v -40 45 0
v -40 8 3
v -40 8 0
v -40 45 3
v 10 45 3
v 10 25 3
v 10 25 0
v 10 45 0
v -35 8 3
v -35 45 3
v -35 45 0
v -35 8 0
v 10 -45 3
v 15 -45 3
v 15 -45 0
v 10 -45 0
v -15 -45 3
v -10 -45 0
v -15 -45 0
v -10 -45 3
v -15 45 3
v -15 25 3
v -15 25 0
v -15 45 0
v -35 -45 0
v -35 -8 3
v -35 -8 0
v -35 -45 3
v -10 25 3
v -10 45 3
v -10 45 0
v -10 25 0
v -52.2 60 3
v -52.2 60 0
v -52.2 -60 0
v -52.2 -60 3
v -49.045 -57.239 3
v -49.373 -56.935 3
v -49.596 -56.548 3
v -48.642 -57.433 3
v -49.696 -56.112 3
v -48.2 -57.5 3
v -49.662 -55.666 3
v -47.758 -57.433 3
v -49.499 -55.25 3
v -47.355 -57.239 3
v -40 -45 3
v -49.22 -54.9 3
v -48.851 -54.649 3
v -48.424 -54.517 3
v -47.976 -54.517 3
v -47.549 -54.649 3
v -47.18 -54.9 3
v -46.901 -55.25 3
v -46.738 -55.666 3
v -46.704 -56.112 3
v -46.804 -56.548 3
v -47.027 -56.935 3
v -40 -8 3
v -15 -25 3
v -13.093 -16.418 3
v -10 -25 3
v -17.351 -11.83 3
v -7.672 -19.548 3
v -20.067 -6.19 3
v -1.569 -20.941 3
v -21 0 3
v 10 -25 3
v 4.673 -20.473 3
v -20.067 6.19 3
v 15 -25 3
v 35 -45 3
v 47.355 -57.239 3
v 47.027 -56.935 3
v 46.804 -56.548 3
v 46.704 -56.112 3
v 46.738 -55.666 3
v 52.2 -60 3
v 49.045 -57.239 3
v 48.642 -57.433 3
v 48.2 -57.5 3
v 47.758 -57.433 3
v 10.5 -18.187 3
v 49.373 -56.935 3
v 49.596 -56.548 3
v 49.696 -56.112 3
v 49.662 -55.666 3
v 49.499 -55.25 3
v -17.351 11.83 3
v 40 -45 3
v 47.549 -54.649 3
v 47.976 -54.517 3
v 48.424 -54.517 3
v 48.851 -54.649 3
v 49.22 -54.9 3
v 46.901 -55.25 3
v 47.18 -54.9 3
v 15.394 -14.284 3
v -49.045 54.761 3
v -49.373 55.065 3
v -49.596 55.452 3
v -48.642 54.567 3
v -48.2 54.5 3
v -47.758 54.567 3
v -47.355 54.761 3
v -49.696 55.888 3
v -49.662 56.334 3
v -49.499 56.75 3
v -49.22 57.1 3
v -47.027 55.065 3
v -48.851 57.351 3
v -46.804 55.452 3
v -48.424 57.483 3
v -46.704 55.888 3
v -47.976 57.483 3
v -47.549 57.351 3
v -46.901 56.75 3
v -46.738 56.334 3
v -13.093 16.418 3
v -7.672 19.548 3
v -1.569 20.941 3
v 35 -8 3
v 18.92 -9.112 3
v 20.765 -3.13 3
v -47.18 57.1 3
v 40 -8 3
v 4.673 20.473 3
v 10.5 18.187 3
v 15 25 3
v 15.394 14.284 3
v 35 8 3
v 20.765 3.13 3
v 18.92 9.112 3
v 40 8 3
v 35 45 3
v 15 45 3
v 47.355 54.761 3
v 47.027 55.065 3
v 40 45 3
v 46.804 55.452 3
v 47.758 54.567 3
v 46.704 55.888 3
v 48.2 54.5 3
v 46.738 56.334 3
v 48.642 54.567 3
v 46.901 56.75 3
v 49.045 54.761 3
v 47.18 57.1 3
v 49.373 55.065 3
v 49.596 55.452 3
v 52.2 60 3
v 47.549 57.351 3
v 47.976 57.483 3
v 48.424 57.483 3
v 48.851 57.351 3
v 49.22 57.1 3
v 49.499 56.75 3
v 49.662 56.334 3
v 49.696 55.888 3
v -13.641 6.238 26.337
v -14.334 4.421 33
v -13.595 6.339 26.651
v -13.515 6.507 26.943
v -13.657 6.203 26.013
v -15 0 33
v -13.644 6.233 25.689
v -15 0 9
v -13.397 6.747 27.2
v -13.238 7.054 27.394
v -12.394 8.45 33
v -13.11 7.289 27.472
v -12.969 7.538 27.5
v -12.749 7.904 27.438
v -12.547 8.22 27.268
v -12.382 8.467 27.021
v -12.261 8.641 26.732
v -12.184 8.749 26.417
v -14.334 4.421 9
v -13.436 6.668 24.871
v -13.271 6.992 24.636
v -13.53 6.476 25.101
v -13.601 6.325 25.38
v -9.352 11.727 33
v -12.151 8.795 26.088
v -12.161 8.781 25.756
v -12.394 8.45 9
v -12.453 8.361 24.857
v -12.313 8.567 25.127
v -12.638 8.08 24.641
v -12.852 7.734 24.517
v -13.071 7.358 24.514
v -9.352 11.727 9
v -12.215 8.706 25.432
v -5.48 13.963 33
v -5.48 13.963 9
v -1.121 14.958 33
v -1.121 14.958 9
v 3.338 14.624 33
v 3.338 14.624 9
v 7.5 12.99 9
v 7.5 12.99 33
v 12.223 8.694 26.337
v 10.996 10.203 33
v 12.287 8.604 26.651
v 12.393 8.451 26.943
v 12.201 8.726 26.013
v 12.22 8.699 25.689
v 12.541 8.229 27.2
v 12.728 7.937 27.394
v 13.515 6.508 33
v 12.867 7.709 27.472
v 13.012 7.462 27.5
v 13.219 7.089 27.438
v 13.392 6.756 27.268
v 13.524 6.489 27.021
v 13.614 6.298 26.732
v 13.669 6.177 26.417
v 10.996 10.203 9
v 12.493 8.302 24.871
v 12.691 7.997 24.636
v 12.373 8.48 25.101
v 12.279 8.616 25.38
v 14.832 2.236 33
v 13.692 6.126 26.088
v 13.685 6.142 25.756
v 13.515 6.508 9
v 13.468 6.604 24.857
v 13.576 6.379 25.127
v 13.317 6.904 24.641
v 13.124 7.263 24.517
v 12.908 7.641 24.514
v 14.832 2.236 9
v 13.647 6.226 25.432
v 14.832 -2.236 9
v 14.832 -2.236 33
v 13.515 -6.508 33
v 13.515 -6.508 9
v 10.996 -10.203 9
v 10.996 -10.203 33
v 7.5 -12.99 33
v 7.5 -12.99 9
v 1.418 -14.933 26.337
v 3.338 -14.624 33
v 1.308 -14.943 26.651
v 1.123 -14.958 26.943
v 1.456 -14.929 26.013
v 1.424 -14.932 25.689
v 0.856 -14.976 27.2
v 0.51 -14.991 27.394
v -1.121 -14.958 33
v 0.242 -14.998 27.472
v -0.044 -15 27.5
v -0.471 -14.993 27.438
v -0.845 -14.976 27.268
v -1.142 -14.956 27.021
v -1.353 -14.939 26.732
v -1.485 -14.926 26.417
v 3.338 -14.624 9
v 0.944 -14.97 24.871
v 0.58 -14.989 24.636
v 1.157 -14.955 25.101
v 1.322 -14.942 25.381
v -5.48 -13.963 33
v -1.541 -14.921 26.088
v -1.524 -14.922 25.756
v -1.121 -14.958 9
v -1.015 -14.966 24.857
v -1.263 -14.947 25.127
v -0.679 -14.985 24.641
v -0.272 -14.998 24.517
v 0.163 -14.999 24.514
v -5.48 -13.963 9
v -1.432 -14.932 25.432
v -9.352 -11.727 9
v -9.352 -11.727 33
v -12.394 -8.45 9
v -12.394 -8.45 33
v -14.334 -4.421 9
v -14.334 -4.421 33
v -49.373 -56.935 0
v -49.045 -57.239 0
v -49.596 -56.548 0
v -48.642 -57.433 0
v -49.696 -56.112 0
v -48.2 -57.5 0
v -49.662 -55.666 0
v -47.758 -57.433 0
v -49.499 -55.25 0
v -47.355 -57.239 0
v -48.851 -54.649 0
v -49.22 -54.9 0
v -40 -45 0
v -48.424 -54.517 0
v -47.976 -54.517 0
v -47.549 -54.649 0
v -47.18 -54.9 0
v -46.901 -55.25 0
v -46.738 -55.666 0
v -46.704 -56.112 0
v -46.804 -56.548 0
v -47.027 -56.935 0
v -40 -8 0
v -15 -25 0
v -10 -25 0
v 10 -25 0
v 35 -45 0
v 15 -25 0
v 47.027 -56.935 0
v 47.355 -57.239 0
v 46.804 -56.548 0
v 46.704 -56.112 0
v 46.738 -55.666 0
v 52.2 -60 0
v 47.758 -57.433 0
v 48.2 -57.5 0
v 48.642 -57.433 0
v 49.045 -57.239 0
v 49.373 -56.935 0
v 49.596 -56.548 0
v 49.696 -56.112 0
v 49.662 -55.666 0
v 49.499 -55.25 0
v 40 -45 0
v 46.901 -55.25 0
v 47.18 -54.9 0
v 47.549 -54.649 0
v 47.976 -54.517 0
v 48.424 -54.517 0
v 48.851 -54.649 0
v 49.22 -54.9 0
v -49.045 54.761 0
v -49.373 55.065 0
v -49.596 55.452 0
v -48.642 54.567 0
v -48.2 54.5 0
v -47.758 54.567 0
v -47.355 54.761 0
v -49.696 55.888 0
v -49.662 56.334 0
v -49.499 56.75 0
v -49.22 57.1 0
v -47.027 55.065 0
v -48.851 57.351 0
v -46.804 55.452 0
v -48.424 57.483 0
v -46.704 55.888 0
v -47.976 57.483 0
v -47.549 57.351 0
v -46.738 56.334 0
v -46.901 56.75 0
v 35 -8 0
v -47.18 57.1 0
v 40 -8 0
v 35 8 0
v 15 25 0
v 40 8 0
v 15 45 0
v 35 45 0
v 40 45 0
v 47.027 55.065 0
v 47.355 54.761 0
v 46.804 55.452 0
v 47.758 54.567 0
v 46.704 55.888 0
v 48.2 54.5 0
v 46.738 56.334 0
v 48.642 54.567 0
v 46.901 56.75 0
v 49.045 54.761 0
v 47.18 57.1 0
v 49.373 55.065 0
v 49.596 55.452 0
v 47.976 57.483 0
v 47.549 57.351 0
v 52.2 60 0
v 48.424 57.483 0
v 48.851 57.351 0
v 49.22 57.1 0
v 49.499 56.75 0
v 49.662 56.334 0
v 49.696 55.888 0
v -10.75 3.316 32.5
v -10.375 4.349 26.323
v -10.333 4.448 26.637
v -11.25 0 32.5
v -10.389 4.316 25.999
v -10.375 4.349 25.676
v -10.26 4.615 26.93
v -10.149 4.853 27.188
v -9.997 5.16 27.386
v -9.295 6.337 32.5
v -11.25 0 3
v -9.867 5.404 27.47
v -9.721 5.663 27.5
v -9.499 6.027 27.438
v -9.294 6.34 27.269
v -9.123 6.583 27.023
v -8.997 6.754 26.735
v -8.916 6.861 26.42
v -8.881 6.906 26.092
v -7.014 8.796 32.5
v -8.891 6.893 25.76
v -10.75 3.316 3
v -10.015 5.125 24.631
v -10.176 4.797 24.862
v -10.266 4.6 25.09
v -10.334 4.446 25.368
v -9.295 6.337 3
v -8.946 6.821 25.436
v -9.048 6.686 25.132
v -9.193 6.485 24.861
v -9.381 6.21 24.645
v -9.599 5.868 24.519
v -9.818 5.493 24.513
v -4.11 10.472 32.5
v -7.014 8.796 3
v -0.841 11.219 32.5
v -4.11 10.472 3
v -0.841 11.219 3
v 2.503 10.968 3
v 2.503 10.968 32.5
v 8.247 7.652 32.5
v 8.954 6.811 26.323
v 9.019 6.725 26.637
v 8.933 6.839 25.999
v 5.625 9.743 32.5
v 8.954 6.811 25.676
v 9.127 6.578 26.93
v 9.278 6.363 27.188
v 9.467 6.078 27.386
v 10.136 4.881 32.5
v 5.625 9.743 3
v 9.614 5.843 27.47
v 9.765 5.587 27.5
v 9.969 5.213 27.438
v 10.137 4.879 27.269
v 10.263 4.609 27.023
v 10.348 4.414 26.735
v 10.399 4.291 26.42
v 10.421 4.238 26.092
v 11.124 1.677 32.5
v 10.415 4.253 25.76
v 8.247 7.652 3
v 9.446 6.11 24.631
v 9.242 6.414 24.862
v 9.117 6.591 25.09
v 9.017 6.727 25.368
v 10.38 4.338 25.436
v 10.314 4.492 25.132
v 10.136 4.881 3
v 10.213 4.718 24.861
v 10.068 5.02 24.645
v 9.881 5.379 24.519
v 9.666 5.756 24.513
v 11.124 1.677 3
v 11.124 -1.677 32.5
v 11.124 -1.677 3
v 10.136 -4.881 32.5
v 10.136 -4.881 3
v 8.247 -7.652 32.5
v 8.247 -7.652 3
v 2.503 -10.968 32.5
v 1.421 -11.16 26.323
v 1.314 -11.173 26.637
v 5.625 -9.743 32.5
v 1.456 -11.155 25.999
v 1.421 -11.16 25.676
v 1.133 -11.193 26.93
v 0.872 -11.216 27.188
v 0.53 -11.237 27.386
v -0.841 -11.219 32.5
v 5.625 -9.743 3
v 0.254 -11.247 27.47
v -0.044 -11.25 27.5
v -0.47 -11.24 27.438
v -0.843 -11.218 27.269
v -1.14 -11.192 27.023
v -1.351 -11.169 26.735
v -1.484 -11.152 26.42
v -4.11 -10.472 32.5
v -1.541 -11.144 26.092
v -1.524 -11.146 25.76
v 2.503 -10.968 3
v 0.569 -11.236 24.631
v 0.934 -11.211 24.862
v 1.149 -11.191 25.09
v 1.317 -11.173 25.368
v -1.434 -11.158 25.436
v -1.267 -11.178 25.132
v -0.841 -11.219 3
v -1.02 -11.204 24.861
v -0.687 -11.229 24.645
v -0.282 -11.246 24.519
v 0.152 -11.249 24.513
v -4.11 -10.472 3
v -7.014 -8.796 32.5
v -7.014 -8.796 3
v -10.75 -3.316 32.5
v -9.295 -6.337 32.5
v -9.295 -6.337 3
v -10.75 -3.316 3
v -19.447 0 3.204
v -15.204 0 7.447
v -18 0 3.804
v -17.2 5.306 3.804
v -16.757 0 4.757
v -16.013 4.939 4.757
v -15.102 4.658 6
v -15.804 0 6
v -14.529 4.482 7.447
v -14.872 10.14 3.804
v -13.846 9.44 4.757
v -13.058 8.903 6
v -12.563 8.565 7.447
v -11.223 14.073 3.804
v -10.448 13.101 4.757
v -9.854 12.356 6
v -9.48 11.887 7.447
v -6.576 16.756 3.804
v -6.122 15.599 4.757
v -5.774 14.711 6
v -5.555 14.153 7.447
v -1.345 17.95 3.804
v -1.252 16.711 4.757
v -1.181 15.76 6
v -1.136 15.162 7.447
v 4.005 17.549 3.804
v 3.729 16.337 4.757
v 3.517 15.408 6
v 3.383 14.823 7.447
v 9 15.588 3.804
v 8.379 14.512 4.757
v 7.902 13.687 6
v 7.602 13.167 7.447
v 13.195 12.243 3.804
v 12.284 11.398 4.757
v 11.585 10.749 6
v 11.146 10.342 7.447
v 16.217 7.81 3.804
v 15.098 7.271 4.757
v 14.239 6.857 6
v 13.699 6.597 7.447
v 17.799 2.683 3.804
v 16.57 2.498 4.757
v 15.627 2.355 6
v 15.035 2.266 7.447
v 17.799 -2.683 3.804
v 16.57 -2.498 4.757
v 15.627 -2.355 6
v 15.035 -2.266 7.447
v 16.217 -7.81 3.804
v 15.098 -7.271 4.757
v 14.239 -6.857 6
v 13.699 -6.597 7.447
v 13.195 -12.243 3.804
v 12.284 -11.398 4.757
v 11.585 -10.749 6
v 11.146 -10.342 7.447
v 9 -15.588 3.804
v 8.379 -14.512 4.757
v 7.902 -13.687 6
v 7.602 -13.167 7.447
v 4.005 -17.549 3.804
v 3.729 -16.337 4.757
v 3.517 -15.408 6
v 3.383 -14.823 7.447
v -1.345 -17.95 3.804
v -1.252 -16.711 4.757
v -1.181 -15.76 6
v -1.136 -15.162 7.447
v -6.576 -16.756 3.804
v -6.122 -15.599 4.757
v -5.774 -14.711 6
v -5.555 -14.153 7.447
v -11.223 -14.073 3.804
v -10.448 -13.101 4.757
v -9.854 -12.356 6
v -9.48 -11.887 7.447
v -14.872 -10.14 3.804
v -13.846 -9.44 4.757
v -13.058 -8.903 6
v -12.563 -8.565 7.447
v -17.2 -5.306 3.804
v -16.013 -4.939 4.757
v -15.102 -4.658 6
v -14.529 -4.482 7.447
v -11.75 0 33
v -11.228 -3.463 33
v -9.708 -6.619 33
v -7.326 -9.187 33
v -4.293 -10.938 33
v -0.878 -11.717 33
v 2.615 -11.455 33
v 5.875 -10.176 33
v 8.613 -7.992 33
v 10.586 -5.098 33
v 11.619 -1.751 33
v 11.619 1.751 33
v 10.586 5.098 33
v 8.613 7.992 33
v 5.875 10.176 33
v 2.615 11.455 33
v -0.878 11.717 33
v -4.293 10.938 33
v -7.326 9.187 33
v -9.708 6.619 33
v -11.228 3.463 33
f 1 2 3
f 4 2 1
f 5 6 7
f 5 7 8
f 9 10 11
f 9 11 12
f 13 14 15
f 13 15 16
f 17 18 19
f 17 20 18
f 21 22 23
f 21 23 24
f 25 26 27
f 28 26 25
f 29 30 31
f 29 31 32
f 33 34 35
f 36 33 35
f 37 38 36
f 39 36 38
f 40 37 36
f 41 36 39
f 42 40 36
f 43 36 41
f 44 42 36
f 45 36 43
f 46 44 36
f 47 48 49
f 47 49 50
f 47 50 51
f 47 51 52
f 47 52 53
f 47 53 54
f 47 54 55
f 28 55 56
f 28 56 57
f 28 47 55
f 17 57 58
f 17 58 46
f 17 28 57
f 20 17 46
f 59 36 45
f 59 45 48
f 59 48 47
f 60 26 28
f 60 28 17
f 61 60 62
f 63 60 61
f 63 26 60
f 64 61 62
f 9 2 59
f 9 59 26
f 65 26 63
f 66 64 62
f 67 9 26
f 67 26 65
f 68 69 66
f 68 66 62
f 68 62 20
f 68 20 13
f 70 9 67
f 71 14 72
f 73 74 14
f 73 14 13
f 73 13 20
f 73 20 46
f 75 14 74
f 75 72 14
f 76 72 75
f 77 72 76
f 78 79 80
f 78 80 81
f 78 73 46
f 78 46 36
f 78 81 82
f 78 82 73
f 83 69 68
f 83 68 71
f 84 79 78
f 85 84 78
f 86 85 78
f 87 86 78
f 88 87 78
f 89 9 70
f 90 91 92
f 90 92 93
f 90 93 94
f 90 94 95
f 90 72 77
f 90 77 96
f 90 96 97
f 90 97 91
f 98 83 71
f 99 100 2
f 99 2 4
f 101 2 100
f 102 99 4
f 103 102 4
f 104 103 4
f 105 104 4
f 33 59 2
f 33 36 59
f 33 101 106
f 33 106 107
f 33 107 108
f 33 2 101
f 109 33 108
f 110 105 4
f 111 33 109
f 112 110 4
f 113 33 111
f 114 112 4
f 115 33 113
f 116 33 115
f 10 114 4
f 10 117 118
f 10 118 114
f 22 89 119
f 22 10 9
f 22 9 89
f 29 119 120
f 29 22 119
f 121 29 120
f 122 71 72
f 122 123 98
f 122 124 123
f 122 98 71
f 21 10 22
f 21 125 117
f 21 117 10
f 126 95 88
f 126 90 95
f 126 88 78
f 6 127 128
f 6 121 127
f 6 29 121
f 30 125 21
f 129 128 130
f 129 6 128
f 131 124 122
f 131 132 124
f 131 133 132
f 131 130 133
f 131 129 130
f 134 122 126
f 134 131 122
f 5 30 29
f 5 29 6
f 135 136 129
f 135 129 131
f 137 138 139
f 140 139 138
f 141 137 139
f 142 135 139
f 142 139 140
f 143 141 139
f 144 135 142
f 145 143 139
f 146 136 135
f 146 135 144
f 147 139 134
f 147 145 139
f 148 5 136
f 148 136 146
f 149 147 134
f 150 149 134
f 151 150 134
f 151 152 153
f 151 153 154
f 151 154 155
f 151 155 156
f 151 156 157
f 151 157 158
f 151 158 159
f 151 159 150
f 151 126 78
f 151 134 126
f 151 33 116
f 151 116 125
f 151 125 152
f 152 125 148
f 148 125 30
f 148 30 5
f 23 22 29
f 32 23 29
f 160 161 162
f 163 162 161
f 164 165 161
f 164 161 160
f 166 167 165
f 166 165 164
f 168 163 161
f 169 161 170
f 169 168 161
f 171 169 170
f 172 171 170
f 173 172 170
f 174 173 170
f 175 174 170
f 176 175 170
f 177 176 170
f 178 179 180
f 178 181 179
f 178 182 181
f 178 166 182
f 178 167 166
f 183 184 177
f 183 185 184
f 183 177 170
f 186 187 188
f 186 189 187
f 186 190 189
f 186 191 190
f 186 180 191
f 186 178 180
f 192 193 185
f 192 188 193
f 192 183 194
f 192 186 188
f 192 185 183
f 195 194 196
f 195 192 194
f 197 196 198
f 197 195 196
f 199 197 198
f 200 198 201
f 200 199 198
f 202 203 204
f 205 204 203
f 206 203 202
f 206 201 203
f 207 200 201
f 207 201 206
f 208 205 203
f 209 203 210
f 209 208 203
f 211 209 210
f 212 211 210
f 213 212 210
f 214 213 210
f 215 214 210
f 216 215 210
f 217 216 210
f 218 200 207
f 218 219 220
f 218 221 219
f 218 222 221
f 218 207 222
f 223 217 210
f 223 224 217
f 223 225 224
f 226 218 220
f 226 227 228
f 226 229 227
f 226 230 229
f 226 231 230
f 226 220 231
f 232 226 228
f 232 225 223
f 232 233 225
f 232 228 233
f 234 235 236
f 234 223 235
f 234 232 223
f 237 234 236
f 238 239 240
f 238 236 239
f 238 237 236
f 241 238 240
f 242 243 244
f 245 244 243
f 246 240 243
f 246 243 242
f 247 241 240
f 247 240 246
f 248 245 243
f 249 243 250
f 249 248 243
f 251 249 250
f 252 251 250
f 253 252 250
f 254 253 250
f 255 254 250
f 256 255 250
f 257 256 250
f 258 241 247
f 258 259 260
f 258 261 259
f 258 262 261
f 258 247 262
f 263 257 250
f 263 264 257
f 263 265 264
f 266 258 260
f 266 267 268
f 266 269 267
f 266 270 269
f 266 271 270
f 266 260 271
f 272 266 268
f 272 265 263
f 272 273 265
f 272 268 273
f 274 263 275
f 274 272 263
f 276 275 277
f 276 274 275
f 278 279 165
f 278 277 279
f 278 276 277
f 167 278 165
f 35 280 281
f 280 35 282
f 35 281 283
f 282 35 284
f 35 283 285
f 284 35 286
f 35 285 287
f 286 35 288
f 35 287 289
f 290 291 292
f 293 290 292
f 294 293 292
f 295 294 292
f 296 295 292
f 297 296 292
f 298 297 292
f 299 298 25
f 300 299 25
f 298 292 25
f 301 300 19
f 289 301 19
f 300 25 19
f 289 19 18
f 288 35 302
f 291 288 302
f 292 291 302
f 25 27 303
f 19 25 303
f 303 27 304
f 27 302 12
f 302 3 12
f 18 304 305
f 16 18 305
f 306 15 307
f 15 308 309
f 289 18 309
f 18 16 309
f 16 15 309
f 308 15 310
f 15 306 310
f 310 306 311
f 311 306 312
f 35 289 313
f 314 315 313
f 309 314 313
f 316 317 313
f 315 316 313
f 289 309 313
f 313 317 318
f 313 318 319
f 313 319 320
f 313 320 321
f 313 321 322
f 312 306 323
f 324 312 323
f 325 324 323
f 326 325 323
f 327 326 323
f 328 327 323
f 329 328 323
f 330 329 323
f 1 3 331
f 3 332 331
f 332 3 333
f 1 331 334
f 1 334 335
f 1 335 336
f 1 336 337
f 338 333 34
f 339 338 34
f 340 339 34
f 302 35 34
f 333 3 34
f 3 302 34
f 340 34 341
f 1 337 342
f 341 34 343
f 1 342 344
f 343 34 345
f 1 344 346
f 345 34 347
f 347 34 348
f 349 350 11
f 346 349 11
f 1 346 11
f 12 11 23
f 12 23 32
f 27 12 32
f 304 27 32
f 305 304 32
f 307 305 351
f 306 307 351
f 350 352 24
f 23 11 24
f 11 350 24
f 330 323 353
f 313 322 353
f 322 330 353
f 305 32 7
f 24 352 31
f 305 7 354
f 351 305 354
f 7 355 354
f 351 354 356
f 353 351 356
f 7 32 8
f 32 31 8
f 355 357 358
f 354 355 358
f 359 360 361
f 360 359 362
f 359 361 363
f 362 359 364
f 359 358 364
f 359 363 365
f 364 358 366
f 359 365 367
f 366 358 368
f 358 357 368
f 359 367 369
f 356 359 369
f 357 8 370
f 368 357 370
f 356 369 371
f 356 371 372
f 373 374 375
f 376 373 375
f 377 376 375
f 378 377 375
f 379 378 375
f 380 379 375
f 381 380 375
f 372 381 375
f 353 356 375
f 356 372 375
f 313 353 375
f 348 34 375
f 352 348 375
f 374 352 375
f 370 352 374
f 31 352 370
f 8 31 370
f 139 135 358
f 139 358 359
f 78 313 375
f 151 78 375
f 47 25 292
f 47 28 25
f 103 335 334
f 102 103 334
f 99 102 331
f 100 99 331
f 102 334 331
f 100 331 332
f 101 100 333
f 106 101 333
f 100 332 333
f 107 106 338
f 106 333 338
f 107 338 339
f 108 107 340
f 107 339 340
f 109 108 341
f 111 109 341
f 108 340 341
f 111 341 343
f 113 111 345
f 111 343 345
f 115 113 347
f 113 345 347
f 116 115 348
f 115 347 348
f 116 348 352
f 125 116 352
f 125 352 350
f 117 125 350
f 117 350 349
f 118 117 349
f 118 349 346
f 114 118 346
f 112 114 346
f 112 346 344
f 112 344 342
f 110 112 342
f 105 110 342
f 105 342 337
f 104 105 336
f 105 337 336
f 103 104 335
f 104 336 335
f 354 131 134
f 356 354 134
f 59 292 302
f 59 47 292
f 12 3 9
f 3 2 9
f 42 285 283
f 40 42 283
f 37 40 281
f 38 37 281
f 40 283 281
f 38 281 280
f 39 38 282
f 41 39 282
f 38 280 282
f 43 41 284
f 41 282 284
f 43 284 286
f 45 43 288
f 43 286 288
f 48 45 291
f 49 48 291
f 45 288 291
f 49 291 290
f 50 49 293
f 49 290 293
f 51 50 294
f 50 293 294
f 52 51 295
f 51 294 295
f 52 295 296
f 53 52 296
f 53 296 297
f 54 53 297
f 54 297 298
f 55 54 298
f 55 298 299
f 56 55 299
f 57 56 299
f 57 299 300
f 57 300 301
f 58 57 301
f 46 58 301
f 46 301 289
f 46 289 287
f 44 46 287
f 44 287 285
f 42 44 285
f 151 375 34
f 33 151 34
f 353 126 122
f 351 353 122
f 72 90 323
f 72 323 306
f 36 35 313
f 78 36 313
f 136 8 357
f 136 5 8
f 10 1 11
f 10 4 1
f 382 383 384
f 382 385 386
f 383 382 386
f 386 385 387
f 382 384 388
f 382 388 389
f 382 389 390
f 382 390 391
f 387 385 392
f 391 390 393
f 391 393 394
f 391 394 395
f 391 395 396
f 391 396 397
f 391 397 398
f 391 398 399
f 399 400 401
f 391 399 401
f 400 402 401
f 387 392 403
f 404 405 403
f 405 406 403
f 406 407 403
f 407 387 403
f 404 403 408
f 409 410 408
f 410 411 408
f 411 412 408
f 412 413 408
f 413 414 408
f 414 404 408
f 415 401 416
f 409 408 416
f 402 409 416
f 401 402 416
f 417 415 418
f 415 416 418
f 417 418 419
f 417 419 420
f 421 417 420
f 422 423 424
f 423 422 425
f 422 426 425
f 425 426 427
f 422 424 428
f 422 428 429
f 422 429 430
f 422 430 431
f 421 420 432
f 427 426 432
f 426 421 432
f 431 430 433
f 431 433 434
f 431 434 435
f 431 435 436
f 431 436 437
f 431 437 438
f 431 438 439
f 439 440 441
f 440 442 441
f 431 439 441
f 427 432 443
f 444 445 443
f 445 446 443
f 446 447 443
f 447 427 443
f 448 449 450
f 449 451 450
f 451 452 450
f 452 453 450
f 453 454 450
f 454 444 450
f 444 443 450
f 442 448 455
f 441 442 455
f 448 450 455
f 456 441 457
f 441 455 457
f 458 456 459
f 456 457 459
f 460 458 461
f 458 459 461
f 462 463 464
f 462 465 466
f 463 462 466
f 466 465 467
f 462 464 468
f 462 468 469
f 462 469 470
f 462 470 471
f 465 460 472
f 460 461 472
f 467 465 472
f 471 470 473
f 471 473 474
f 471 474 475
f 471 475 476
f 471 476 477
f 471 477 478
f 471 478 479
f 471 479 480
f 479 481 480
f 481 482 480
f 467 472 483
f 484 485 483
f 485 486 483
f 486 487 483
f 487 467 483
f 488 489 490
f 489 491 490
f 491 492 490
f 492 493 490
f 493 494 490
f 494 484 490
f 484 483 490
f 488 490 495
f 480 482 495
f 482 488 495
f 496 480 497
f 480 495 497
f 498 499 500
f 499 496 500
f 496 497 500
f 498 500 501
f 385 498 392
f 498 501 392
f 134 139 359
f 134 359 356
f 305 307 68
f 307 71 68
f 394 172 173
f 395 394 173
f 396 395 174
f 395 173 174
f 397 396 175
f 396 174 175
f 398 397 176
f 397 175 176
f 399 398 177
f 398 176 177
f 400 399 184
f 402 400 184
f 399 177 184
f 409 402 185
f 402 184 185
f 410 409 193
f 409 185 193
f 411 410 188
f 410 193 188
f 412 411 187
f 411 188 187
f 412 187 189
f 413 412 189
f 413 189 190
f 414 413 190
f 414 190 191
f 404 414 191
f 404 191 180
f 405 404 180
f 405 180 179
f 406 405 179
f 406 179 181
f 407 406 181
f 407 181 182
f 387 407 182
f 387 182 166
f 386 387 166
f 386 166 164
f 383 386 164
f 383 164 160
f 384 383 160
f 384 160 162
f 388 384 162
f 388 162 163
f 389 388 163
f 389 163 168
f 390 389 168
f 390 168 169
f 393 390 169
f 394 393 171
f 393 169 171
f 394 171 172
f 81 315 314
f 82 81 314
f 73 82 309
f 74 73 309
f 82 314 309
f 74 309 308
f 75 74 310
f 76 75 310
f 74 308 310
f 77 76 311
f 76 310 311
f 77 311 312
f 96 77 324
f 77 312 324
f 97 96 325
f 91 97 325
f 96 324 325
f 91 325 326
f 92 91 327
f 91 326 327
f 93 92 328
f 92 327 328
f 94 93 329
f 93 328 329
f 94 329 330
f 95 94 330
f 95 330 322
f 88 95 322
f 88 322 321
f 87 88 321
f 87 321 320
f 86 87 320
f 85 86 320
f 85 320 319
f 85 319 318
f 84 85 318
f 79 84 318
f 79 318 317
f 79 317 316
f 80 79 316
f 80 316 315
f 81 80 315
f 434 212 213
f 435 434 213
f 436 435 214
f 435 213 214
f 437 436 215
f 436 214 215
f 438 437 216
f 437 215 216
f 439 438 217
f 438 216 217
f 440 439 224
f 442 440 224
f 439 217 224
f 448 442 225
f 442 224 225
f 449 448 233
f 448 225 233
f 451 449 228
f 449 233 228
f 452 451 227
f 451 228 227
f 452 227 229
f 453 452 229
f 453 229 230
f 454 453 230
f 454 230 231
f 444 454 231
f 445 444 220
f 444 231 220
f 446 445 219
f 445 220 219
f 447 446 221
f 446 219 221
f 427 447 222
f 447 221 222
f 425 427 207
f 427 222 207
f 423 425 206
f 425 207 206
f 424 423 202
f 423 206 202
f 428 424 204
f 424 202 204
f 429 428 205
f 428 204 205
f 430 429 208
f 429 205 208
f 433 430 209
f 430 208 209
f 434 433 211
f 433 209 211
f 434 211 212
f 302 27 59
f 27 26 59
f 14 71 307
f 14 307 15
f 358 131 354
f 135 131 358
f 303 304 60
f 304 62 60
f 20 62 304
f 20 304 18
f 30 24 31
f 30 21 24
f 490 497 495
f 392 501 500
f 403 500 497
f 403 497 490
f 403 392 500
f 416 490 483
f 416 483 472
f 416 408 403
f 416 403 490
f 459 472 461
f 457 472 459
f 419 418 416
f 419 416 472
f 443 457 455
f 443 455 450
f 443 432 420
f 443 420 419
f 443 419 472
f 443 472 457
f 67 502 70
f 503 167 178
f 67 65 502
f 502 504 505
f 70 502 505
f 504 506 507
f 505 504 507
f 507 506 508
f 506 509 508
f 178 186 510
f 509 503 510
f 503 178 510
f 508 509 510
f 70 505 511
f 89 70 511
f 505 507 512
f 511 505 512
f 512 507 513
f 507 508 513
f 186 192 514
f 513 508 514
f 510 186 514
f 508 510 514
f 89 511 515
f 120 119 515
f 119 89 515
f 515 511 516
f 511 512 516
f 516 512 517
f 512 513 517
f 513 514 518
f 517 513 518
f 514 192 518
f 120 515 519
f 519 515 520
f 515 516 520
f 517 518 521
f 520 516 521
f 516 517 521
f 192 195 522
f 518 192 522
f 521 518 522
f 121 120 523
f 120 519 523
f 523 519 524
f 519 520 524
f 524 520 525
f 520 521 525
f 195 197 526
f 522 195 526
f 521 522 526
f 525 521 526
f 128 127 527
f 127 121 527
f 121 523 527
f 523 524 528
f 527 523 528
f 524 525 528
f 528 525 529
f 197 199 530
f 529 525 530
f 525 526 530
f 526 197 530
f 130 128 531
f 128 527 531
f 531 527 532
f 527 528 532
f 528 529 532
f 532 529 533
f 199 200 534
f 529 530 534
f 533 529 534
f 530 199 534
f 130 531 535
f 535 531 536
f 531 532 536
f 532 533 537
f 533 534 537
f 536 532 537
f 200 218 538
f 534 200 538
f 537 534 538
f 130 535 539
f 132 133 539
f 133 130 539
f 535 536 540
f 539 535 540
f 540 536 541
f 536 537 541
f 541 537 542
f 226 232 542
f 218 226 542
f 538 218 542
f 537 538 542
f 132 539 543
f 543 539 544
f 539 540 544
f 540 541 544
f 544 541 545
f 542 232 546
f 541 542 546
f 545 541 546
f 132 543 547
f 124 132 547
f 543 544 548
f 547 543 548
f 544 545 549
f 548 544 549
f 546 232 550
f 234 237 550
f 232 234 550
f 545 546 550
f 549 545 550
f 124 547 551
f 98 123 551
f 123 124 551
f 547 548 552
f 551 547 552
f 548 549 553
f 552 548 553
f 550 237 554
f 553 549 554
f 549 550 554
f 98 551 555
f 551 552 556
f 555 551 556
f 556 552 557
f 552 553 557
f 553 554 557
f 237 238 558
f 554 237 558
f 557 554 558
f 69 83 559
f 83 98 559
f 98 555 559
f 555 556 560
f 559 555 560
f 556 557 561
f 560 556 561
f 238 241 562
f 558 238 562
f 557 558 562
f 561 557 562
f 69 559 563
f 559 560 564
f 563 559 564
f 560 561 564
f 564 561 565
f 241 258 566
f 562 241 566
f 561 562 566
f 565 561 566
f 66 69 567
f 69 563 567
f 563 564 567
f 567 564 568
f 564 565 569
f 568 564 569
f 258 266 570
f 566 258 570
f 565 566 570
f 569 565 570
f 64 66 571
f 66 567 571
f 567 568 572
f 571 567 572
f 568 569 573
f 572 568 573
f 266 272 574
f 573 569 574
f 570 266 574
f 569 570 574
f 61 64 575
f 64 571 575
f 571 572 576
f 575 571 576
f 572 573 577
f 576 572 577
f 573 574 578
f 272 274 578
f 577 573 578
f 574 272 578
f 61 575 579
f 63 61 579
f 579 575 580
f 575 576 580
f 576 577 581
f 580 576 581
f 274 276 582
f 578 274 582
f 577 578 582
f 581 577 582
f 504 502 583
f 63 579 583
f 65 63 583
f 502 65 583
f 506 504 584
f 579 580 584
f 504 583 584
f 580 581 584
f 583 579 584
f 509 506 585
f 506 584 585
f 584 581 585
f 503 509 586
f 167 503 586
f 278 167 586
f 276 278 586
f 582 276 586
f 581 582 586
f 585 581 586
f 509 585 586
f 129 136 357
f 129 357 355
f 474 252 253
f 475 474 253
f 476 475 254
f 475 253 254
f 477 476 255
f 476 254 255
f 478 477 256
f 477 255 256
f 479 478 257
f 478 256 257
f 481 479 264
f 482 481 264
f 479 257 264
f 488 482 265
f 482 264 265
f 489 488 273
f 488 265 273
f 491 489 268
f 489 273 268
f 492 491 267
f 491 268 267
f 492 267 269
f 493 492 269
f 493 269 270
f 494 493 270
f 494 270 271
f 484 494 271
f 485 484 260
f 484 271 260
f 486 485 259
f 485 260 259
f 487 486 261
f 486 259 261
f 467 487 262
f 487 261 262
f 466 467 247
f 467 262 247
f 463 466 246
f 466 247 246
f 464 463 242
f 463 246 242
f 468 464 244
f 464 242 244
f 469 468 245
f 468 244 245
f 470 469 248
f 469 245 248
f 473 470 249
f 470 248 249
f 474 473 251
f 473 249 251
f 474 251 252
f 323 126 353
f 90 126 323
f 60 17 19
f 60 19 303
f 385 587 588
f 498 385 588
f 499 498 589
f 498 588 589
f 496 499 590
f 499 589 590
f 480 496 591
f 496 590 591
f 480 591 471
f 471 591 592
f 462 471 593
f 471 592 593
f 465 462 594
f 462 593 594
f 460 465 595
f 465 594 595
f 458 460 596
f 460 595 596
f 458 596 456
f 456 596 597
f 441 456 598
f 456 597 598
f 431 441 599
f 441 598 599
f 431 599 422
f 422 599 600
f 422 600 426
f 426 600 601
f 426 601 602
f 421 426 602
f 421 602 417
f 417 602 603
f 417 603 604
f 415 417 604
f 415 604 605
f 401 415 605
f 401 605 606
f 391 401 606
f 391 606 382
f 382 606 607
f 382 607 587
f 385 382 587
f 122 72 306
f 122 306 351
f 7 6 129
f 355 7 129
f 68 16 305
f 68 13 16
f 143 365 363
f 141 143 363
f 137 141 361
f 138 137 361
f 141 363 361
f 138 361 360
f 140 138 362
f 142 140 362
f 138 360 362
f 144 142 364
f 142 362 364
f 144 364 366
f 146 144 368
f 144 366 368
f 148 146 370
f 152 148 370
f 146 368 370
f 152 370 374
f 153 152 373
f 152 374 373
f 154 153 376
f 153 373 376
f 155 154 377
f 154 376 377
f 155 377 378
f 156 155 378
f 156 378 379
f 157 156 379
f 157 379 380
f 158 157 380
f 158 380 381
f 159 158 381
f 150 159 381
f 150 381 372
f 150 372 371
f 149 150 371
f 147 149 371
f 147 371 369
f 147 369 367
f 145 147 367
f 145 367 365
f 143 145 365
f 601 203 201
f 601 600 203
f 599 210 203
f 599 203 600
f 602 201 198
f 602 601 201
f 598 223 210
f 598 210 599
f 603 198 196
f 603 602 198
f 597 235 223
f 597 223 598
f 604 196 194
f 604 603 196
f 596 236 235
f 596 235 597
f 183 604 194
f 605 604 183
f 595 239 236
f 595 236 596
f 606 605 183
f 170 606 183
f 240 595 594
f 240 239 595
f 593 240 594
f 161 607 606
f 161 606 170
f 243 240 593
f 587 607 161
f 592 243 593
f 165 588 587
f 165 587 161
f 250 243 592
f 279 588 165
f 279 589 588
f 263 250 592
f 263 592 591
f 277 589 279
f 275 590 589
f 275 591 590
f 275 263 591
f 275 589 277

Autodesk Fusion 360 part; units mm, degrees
sketch "Sketch1" plane through (0, 0, 0) normal (0, 0, 1) x (1, 0, 0)
  line L0 (-52.2, -60) -> (52.2, -60)
  line L1 (52.2, -60) -> (52.2, 60)
  line L2 (52.2, 60) -> (-52.2, 60)
  line L3 (-52.2, 60) -> (-52.2, -60)
  dimension "d1" = 104.4
  dimension "d2" = 120
  dimension "d3" = 60
  dimension "d4" = 52.2
extrude "Extrude1" add sketch "Sketch1" along normal blind 3
sketch "Sketch2" plane through (0, 0, 3) normal (0, 0, 1) x (-1, 0, 0)
  line L0 (52.2, -60) -> (52.2, 60)
  line L1 (52.2, 60) -> (-52.2, 60)
  line L2 (-52.2, 60) -> (-52.2, -60)
  line L3 (-52.2, -60) -> (52.2, -60)
  circle A0 centre (-48.2, -56) radius 1.5
  circle A1 centre (48.2, -56) radius 1.5
  circle A2 centre (48.2, 56) radius 1.5
  circle A3 centre (-48.2, 56) radius 1.5
  dimension "d7" = 3
  dimension "d8" = 3
  dimension "d9" = 3
  dimension "d10" = 3
  dimension "d11" = 4
  dimension "d12" = 4
  dimension "d13" = 4
  dimension "d14" = 4
  dimension "d15" = 4
  dimension "d16" = 4
  dimension "d17" = 4
  dimension "d18" = 4
hole "Hole1" at (-48.2, 56, 3) at (48.2, 56, 3) at (48.2, -56, 3) at (-48.2, -56, 3) direction (0, 0, -1) diameter 3 depth 3 tip angle 118
sketch "Sketch4" plane through (0, 0, 3) normal (0, 0, 1) x (-1, 0, 0)
  circle A0 centre (-48.2, 56) radius 1.5
  circle A1 centre (48.2, -56) radius 1.5
  circle A2 centre (-48.2, -56) radius 1.5
  circle A3 centre (48.2, 56) radius 1.5
  line L0 (52.2, -60) -> (52.2, 60)
  line L1 (52.2, 60) -> (-52.2, 60)
  line L2 (-52.2, 60) -> (-52.2, -60)
  line L3 (-52.2, -60) -> (52.2, -60)
  line L4 (40, -45) -> (35, -45)
  line L5 (35, -45) -> (35, 45)
  line L6 (35, 45) -> (40, 45)
  line L7 (40, 45) -> (40, -45)
  line L8 (10, -45) -> (10, 45)
  line L9 (10, 45) -> (15, 45)
  line L10 (15, 45) -> (15, -45)
  line L11 (15, -45) -> (10, -45)
  line L12 (-15, -45) -> (-15, 45)
  line L13 (-15, 45) -> (-10, 45)
  line L14 (-10, 45) -> (-10, -45)
  line L15 (-10, -45) -> (-15, -45)
  line L16 (-40, -45) -> (-40, 45)
  line L17 (-40, 45) -> (-35, 45)
  line L18 (-35, 45) -> (-35, -45)
  line L19 (-35, -45) -> (-40, -45)
  dimension "d39" = -75
  dimension "d40" = 0
  dimension "d41" = 5
  dimension "d42" = 90
  dimension "d43" = 40
  dimension "d44" = 45
extrude "Extrude2" cut sketch "Sketch4" against normal blind 3 contours L4 L5 L6 L7 | L8 L9 L10 L11 | L12 L13 L14 L15 | L16 L17 L18 L19
sketch "Sketch6" plane through (0, 0, 3) normal (0, 0, 1) x (-1, 0, 0)
  line L0 (10, 45) -> (15, 45)
  line L1 (15, 45) -> (15, -45)
  line L2 (15, -45) -> (10, -45)
  line L3 (10, -45) -> (10, 45)
  line L4 (-15, 45) -> (-10, 45)
  line L5 (-10, 45) -> (-10, -45)
  line L6 (-10, -45) -> (-15, -45)
  line L7 (-15, -45) -> (-15, 45)
  line L8 (35, -45) -> (35, 45)
  line L9 (35, 45) -> (40, 45)
  line L10 (40, 45) -> (40, -45)
  line L11 (40, -45) -> (35, -45)
  line L12 (-40, 45) -> (-35, 45)
  line L13 (-35, 45) -> (-35, -45)
  line L14 (-35, -45) -> (-40, -45)
  line L15 (-40, -45) -> (-40, 45)
  circle A0 centre (-48.2, 56) radius 1.5
  circle A1 centre (48.2, -56) radius 1.5
  circle A2 centre (-48.2, -56) radius 1.5
  circle A3 centre (48.2, 56) radius 1.5
  line L16 (52.2, -60) -> (52.2, 60)
  line L17 (52.2, 60) -> (-52.2, 60)
  line L18 (-52.2, 60) -> (-52.2, -60)
  line L19 (-52.2, -60) -> (52.2, -60)
  line L20 (-15, 25) -> (15, 25)
  line L21 (15, 25) -> (15, -25)
  line L22 (15, -25) -> (-15, -25)
  line L23 (-15, -25) -> (-15, 25)
  line L24 (-15, 25) -> (15, -25) construction
  line L25 (15, 25) -> (-15, -25) construction
  line L26 (40, -8) -> (35, -8)
  line L27 (35, -8) -> (35, 8)
  line L28 (35, 8) -> (40, 8)
  line L29 (40, 8) -> (40, -8)
  line L30 (-35, -8) -> (-40, -8)
  line L31 (-40, -8) -> (-40, 8)
  line L32 (-40, 8) -> (-35, 8)
  line L33 (-35, 8) -> (-35, -8)
  dimension "d49" = 50
  dimension "d56" = 8
  dimension "d57" = 16
  dimension "d58" = 8
  dimension "d59" = 16
extrude "Extrude3" add sketch "Sketch6" against normal blind 3 contours L1 L3 L20 L21 L22 | L5 L7 L20 L22 L23 | L8 L10 L26 L27 L28 L29 | L13 L15 L30 L31 L32 L33
sketch "Sketch5" plane through (0, 0, 3) normal (0, 0, 1) x (-1, 0, 0)
  line L0 (10, 45) -> (15, 45)
  line L1 (15, 45) -> (15, 25)
  line L2 (15, -45) -> (10, -45)
  line L3 (10, 25) -> (10, 45)
  line L4 (-15, 45) -> (-10, 45)
  line L5 (-10, -25) -> (-10, -45)
  line L6 (-10, -45) -> (-15, -45)
  line L7 (-15, -45) -> (-15, -25)
  line L8 (35, 8) -> (35, 45)
  line L9 (35, 45) -> (40, 45)
  line L10 (40, 45) -> (40, 8)
  line L11 (40, -45) -> (35, -45)
  line L12 (-40, 45) -> (-35, 45)
  line L13 (-35, 45) -> (-35, 8)
  line L14 (-35, -45) -> (-40, -45)
  line L15 (-40, 8) -> (-40, 45)
  circle A0 centre (-48.2, 56) radius 1.5
  circle A1 centre (48.2, -56) radius 1.5
  circle A2 centre (-48.2, -56) radius 1.5
  circle A3 centre (48.2, 56) radius 1.5
  line L16 (52.2, -60) -> (52.2, 60)
  line L17 (52.2, 60) -> (-52.2, 60)
  line L18 (-52.2, 60) -> (-52.2, -60)
  line L19 (-52.2, -60) -> (52.2, -60)
  circle A4 centre (0, 0) radius 11.25
  circle A5 centre (0, 0) radius 15
  line L20 (15, 25) -> (10, 25)
  line L21 (-15, -25) -> (-10, -25)
  line L22 (10, -25) -> (15, -25)
  line L23 (15, -25) -> (15, -45)
  line L24 (10, -45) -> (10, -25)
  line L25 (-10, 25) -> (-15, 25)
  line L26 (-15, 25) -> (-15, 45)
  line L27 (-10, 45) -> (-10, 25)
  line L28 (-35, 8) -> (-40, 8)
  line L29 (40, 8) -> (35, 8)
  line L30 (35, -8) -> (40, -8)
  line L31 (40, -8) -> (40, -45)
  line L32 (35, -45) -> (35, -8)
  line L33 (-40, -8) -> (-35, -8)
  line L34 (-35, -8) -> (-35, -45)
  line L35 (-40, -45) -> (-40, -8)
  dimension "d47" = 22.5
  dimension "d48" = 30
extrude "Extrude4" add sketch "Sketch5" along normal blind 30 contours A5
fillet "Fillet1" radius 6 1 edges at (13.9849, -5.4242, 3)
chamfer "Chamfer1" distance 0.5 angle 45 1 edges at (10.4887, -4.0682, 33)
sketch "Sketch7" plane through (0, 0, 0) normal (0, 1, 0) x (1, 0, 0)
  circle A0 centre (-0.0436, -26) radius 1.5
  dimension "d61" = 26
  dimension "d62" = 3
hole "Hole3" at (-0.0436, 0, 26) direction (0, -1, 0) diameter 3 depth 17 tip angle 118
thread "Thread1"
pattern_circular "C-Pattern1" count 3 over 360 about axis through (0, 0, 1.75) along (0, 0, 1) of "Hole3"
